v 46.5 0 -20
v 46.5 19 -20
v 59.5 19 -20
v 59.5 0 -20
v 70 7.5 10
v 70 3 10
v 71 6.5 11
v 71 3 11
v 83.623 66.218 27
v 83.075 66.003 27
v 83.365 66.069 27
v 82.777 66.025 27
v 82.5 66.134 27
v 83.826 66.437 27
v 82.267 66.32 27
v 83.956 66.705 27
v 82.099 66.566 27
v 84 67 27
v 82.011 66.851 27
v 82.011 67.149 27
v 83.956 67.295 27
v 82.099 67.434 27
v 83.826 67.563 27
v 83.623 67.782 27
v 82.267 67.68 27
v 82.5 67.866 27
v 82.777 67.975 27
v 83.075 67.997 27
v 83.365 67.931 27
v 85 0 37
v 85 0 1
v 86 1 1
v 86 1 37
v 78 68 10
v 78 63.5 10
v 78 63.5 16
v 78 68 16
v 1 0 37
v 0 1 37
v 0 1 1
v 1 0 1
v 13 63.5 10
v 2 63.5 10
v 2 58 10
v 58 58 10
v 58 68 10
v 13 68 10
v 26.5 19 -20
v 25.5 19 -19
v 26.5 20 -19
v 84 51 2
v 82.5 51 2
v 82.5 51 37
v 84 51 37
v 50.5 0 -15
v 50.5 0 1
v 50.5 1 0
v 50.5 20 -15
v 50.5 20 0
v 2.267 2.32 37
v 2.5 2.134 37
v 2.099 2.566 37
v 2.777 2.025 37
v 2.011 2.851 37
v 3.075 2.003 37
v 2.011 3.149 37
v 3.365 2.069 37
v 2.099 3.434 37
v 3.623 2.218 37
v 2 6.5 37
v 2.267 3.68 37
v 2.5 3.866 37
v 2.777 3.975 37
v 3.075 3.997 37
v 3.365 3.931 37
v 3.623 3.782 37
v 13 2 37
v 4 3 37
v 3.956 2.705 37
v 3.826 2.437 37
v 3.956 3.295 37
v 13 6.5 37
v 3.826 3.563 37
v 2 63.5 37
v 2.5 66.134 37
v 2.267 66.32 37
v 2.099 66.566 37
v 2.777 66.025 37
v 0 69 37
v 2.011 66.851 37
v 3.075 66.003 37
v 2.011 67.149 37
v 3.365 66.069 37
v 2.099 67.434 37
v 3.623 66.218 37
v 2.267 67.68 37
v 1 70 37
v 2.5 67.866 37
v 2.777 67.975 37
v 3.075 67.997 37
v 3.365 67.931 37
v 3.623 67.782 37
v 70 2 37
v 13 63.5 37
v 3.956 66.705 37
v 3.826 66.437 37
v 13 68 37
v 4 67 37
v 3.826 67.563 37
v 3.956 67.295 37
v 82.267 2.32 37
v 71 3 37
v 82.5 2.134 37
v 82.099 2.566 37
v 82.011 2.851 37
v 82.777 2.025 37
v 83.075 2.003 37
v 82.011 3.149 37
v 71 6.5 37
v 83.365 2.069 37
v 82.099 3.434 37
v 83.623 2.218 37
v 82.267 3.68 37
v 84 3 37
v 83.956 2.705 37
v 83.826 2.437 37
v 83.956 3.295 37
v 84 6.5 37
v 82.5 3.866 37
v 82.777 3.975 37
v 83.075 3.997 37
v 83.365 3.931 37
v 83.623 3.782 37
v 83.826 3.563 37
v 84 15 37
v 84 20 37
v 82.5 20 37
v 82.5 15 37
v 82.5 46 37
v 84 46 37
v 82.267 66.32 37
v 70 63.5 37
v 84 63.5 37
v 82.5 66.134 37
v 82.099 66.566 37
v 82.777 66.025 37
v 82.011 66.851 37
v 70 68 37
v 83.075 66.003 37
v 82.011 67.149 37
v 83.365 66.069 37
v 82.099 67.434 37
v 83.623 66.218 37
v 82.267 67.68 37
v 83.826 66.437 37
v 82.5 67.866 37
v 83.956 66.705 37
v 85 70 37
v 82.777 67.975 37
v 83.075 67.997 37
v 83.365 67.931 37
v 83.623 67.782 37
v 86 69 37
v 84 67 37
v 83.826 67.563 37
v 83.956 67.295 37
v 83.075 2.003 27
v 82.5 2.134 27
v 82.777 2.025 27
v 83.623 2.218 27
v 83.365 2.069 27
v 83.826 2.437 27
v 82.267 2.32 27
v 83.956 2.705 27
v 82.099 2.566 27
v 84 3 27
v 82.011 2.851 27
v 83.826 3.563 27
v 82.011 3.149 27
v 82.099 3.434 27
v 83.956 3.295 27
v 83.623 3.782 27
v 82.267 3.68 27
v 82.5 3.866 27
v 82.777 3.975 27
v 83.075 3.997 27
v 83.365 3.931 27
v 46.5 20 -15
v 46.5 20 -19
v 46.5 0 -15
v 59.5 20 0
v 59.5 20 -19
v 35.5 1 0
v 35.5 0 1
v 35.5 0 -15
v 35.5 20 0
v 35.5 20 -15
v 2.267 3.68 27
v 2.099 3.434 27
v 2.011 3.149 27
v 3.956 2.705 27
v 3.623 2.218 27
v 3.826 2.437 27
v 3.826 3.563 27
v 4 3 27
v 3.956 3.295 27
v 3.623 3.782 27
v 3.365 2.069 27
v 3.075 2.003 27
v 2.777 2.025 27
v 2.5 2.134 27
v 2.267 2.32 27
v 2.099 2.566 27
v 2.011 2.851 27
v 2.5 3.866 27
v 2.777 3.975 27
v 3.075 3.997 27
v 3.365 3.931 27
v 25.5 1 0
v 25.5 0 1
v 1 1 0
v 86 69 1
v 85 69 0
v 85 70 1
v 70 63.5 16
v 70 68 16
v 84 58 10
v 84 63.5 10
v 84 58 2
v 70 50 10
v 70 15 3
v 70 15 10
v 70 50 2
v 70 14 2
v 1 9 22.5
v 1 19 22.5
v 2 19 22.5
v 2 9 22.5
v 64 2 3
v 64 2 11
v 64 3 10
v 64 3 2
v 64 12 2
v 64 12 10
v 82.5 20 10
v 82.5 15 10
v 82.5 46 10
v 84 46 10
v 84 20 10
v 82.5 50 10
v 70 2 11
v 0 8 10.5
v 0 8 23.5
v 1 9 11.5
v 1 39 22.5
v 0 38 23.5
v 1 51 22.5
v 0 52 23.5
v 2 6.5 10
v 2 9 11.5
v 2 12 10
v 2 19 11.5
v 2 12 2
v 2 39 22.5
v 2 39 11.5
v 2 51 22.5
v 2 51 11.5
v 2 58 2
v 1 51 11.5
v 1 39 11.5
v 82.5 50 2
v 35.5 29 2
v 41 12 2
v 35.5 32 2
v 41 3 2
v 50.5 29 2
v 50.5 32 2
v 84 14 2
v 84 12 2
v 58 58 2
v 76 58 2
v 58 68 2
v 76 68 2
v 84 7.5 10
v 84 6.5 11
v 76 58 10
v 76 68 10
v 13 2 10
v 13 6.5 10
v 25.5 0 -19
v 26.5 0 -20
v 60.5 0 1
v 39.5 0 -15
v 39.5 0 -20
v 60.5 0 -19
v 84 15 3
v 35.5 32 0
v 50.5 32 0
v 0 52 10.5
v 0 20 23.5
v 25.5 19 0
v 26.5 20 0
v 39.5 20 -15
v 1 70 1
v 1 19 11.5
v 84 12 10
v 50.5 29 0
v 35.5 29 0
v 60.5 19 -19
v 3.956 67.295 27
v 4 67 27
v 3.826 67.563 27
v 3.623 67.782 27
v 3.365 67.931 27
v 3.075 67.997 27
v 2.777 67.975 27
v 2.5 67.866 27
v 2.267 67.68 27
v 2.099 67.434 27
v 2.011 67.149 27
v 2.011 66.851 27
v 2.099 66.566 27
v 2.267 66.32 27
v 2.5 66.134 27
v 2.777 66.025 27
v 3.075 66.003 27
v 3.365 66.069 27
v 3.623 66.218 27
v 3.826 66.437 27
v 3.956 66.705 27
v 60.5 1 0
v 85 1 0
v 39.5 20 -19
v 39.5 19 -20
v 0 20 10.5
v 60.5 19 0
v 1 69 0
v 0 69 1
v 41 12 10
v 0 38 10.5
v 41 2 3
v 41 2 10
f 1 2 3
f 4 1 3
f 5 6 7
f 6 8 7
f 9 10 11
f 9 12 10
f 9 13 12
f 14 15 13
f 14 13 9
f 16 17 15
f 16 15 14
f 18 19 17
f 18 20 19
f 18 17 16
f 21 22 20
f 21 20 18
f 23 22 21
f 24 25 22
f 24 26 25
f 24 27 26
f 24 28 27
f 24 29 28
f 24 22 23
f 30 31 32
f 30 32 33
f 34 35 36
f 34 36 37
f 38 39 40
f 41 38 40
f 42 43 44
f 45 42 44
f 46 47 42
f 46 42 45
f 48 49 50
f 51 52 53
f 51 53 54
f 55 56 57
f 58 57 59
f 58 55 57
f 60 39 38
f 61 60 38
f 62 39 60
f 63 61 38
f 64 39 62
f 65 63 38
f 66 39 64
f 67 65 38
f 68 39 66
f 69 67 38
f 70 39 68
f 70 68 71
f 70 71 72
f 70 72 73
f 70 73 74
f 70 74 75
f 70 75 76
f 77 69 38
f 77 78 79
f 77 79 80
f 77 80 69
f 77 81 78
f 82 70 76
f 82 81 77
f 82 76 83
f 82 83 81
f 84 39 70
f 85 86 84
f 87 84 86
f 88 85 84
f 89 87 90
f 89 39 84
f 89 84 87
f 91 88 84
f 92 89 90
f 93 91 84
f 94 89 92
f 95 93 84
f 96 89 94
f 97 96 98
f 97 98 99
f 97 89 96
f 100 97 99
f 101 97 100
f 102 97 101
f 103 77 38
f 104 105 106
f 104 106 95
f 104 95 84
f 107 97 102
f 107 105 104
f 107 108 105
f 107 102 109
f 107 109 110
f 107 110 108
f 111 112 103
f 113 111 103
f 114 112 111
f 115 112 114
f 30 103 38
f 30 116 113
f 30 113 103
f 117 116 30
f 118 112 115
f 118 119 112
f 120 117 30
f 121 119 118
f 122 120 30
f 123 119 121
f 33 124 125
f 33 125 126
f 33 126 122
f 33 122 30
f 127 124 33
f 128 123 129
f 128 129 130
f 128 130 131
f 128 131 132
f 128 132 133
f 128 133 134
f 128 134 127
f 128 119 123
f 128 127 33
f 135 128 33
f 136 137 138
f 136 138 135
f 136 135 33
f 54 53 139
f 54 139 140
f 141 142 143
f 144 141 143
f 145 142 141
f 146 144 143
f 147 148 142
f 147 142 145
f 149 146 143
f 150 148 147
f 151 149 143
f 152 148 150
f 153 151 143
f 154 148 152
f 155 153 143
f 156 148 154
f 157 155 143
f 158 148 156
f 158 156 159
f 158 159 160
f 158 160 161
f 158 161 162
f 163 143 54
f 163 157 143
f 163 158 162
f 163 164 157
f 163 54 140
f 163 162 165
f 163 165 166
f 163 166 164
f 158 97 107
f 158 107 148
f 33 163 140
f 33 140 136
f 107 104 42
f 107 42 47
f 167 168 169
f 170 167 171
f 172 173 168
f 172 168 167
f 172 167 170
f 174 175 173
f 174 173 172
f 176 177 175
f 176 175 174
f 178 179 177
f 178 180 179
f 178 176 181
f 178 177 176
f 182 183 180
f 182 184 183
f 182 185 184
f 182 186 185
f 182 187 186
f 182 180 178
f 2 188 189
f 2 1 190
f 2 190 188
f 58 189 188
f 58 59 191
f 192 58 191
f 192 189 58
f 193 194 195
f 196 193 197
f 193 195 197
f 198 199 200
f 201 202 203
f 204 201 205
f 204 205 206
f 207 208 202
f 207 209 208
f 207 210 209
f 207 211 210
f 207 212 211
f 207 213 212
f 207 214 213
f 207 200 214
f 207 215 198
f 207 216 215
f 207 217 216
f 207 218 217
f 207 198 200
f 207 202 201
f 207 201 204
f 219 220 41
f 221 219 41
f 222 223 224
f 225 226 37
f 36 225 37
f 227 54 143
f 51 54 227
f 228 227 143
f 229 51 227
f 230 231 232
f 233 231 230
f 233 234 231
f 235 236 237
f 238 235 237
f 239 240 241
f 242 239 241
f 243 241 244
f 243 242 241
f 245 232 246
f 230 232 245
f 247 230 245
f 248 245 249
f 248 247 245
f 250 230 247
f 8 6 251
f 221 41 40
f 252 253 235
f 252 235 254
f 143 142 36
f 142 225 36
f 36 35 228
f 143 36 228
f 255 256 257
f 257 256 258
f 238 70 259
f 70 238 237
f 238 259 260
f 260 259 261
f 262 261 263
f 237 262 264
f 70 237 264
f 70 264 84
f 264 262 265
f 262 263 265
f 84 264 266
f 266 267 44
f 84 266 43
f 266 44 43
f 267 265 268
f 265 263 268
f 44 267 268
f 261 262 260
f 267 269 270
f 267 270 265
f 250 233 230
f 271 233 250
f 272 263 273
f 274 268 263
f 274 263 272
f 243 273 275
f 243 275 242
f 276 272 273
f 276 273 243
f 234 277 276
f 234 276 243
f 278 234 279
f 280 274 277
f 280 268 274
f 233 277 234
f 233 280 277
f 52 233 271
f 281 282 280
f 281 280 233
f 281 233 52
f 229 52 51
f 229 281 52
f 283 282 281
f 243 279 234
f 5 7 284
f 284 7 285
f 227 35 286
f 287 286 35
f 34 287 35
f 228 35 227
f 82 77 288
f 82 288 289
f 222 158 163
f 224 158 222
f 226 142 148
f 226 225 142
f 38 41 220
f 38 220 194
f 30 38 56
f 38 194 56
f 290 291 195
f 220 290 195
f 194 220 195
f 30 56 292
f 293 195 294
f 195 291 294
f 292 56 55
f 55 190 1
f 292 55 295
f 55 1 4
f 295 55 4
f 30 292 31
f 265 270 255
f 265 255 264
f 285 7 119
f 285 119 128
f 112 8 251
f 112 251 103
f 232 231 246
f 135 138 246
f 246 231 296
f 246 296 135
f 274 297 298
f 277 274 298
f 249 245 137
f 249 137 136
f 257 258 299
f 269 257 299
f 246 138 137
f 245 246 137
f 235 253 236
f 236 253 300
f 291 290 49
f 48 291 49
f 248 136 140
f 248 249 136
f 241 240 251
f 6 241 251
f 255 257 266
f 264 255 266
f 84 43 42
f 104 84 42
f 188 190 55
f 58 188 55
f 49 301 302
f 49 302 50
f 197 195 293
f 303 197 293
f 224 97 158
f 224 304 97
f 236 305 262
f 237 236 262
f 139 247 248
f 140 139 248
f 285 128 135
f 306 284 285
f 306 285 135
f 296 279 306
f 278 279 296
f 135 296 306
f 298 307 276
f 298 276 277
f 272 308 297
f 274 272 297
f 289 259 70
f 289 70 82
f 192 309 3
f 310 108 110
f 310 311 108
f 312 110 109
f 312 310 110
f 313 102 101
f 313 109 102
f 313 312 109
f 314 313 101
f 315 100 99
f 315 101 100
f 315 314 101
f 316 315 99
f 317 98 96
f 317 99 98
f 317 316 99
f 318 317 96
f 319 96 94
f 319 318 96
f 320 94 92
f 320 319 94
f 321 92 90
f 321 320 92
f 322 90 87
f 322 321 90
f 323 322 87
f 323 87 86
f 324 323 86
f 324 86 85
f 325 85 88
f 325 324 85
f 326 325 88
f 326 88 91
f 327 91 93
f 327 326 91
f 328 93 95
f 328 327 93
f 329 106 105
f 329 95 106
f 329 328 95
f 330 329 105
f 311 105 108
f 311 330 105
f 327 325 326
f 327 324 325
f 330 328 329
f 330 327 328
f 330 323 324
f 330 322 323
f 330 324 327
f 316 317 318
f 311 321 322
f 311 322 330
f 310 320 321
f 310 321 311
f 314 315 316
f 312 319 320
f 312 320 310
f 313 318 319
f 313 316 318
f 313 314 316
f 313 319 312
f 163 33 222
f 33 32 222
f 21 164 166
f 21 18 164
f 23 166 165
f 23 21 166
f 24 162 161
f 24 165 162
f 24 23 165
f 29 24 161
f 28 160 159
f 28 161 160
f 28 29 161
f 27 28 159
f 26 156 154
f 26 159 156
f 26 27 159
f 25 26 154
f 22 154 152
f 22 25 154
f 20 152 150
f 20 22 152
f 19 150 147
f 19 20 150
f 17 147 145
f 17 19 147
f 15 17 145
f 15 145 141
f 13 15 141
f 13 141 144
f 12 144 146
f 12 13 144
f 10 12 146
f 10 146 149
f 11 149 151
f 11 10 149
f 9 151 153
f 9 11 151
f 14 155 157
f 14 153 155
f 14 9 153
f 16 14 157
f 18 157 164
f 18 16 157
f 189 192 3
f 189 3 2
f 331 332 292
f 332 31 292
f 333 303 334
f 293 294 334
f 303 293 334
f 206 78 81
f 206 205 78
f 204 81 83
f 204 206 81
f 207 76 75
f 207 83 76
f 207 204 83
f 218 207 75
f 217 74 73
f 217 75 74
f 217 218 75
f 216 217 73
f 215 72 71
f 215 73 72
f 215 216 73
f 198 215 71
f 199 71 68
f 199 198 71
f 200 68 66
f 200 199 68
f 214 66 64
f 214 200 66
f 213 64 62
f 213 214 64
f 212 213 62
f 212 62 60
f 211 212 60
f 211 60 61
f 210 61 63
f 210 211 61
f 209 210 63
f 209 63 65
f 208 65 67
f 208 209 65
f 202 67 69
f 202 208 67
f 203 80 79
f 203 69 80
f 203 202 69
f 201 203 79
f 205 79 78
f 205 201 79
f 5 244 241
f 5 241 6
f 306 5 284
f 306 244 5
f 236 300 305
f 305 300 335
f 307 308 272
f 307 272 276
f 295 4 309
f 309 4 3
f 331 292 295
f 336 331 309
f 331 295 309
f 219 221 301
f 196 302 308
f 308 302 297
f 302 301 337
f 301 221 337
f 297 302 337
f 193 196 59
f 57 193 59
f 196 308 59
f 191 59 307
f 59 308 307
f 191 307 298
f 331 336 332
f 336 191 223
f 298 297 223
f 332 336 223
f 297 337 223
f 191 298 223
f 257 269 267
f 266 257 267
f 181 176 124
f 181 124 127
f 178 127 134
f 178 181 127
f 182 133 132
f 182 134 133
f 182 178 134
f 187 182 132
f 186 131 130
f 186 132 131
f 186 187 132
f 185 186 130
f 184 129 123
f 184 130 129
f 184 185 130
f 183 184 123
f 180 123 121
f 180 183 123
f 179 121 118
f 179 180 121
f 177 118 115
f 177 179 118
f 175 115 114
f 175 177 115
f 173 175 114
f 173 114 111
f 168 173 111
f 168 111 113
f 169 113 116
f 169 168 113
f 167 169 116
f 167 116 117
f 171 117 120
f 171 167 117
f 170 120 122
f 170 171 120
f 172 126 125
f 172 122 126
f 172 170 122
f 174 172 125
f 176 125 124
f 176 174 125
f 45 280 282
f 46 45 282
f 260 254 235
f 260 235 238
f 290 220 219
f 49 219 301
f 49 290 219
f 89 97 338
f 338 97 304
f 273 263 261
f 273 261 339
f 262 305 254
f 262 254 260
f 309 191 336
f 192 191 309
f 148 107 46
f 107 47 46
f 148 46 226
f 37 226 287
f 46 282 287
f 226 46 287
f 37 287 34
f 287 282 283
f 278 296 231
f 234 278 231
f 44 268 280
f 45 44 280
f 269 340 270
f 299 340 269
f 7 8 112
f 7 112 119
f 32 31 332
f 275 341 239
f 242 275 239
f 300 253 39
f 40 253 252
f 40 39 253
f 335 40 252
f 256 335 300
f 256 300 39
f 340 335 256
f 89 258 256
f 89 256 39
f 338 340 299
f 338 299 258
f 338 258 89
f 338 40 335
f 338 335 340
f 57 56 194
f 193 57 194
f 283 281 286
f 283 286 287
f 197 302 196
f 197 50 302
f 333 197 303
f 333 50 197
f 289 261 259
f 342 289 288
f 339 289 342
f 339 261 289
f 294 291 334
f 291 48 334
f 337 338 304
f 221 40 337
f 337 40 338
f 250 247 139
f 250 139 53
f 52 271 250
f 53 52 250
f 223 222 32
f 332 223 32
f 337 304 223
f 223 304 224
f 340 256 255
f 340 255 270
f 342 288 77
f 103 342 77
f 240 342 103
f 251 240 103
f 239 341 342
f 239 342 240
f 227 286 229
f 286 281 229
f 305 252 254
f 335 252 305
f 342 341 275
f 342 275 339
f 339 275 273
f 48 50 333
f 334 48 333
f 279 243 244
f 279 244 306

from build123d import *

# Parameters (mm, degrees)
BOX028_W          = 15
BOX028_H          = 3
BOX028_DEPTH      = 3
BOX001_W          = 86
BOX001_H          = 2
BOX001_DEPTH      = 37
BOX002_W          = 86
BOX002_H          = 2
BOX002_DEPTH      = 37
BOX004_W          = 2
BOX004_H          = 70
BOX004_DEPTH      = 37
CYLINDER_R        = 1
CYLINDER_DEPTH    = 10
BOX005_W          = 13
BOX005_H          = 6.5
BOX005_DEPTH      = 37
CYLINDER001_R     = 1
CYLINDER001_DEPTH = 10
BOX007_W          = 13
BOX007_H          = 6.5
BOX007_DEPTH      = 37
CYLINDER002_R     = 1
CYLINDER002_DEPTH = 10
BOX006_W          = 15
BOX006_H          = 6.5
BOX006_DEPTH      = 37
BOX009_W          = 10
BOX009_H          = 10
BOX009_DEPTH      = 11
BOX010_W          = 16
BOX010_H          = 12
BOX010_DEPTH      = 11
BOX003_W          = 2
BOX003_H          = 70
BOX003_DEPTH      = 37
BOX018_W          = 15
BOX018_H          = 35
BOX018_DEPTH      = 10
BOX019_W          = 10
BOX019_H          = 20
BOX019_DEPTH      = 20
BOX020_W          = 10
BOX020_H          = 20
BOX020_DEPTH      = 20
BOX021_W          = 14
BOX021_H          = 20
BOX021_DEPTH      = 5
BOX022_W          = 14
BOX022_H          = 20
BOX022_DEPTH      = 5
BOX023_W          = 1.5
BOX023_H          = 5
BOX023_DEPTH      = 37
BOX024_W          = 1.5
BOX024_H          = 5
BOX024_DEPTH      = 37
BOX025_W          = 23
BOX025_H          = 10
BOX025_DEPTH      = 8
BOX016_W          = 86
BOX016_H          = 12
BOX016_DEPTH      = 10
BOX026_W          = 18
BOX026_H          = 10
BOX026_DEPTH      = 8
BOX017_W          = 86
BOX017_H          = 12
BOX017_DEPTH      = 10
BOX027_W          = 8
BOX027_H          = 5
BOX027_DEPTH      = 14
CYLINDER003_R     = 1
CYLINDER003_DEPTH = 10
BOX008_W          = 16
BOX008_H          = 6.5
BOX008_DEPTH      = 37
BOX_W             = 86
BOX_H             = 70
BOX_DEPTH         = 2
CHAMFER_SIZE      = 1


with BuildPart() as cubo028:
    # Box028 → Box028 (new body)
    with BuildSketch(Plane(origin=(35.5, 29, -1), x_dir=(1, 0, 0), z_dir=(0, 0, 1))):
        with Locations((7.5, 1.5)):
            Rectangle(BOX028_W, BOX028_H)
    extrude(amount=BOX028_DEPTH)


with BuildPart() as cubo001:
    # Box001 → Box001 (new body)
    with BuildSketch(Plane.XY):
        with Locations((43, 1)):
            Rectangle(BOX001_W, BOX001_H)
    extrude(amount=BOX001_DEPTH)


with BuildPart() as cubo002:
    # Box002 → Box002 (new body)
    with BuildSketch(Plane(origin=(0, 68, 0), x_dir=(1, 0, 0), z_dir=(0, 0, 1))):
        with Locations((43, 1)):
            Rectangle(BOX002_W, BOX002_H)
    extrude(amount=BOX002_DEPTH)


with BuildPart() as cubo004:
    # Box004 → Box004 (new body)
    with BuildSketch(Plane(origin=(84, 0, 0), x_dir=(1, 0, 0), z_dir=(0, 0, 1))):
        with Locations((1, 35)):
            Rectangle(BOX004_W, BOX004_H)
    extrude(amount=BOX004_DEPTH)


with BuildPart() as cilindro:
    # Cylinder → Cylinder (new body)
    with BuildSketch(Plane(origin=(3, 3, 27), x_dir=(1, 0, 0), z_dir=(0, 0, 1))):
        Circle(CYLINDER_R)
    extrude(amount=CYLINDER_DEPTH)


with BuildPart() as cut002:
    # Box005 → Box005 (new body)
    with BuildSketch(Plane.XY):
        with Locations((6.5, 3.25)):
            Rectangle(BOX005_W, BOX005_H)
    extrude(amount=BOX005_DEPTH)

    # Cut002: cut Cilindro
    add(cilindro.part, mode=Mode.SUBTRACT)


with BuildPart() as cilindro001:
    # Cylinder001 → Cylinder001 (new body)
    with BuildSketch(Plane(origin=(3, 67, 27), x_dir=(1, 0, 0), z_dir=(0, 0, 1))):
        Circle(CYLINDER001_R)
    extrude(amount=CYLINDER001_DEPTH)


with BuildPart() as cut003:
    # Box007 → Box007 (new body)
    with BuildSketch(Plane(origin=(0, 63.5, 0), x_dir=(1, 0, 0), z_dir=(0, 0, 1))):
        with Locations((6.5, 3.25)):
            Rectangle(BOX007_W, BOX007_H)
    extrude(amount=BOX007_DEPTH)

    # Cut003: cut Cilindro001
    add(cilindro001.part, mode=Mode.SUBTRACT)


with BuildPart() as cilindro002:
    # Cylinder002 → Cylinder002 (new body)
    with BuildSketch(Plane(origin=(83, 3, 27), x_dir=(1, 0, 0), z_dir=(0, 0, 1))):
        Circle(CYLINDER002_R)
    extrude(amount=CYLINDER002_DEPTH)


with BuildPart() as cut004:
    # Box006 → Box006 (new body)
    with BuildSketch(Plane(origin=(71, 0, 0), x_dir=(1, 0, 0), z_dir=(0, 0, 1))):
        with Locations((7.5, 3.25)):
            Rectangle(BOX006_W, BOX006_H)
    extrude(amount=BOX006_DEPTH)

    # Cut004: cut Cilindro002
    add(cilindro002.part, mode=Mode.SUBTRACT)


with BuildPart() as cubo009:
    # Box009 → Box009 (new body)
    with BuildSketch(Plane(origin=(-1, 9, 11.5), x_dir=(1, 0, 0), z_dir=(0, 0, 1))):
        with Locations((5, 5)):
            Rectangle(BOX009_W, BOX009_H)
    extrude(amount=BOX009_DEPTH)


with BuildPart() as cubo010:
    # Box010 → Box010 (new body)
    with BuildSketch(Plane(origin=(-1, 39, 11.5), x_dir=(1, 0, 0), z_dir=(0, 0, 1))):
        with Locations((8, 6)):
            Rectangle(BOX010_W, BOX010_H)
    extrude(amount=BOX010_DEPTH)


with BuildPart() as cut006:
    # Box003 → Box003 (new body)
    with BuildSketch(Plane.XY):
        with Locations((1, 35)):
            Rectangle(BOX003_W, BOX003_H)
    extrude(amount=BOX003_DEPTH)

    # Cut: cut Cubo010
    add(cubo010.part, mode=Mode.SUBTRACT)

    # Cut006: cut Cubo009
    add(cubo009.part, mode=Mode.SUBTRACT)


with BuildPart() as cubo018:
    # Box018 → Box018 (new body)
    with BuildSketch(Plane(origin=(70, 15, 0), x_dir=(1, 0, 0), z_dir=(0, 0, 1))):
        with Locations((7.5, 17.5)):
            Rectangle(BOX018_W, BOX018_H)
    extrude(amount=BOX018_DEPTH)


with BuildPart() as cubo019:
    # Box019 → Box019 (new body)
    with BuildSketch(Plane(origin=(25.5, 0, -20), x_dir=(1, 0, 0), z_dir=(0, 0, 1))):
        with Locations((5, 10)):
            Rectangle(BOX019_W, BOX019_H)
    extrude(amount=BOX019_DEPTH)


with BuildPart() as cubo020:
    # Box020 → Box020 (new body)
    with BuildSketch(Plane(origin=(50.5, 0, -20), x_dir=(1, 0, 0), z_dir=(0, 0, 1))):
        with Locations((5, 10)):
            Rectangle(BOX020_W, BOX020_H)
    extrude(amount=BOX020_DEPTH)


with BuildPart() as cubo021:
    # Box021 → Box021 (new body)
    with BuildSketch(Plane(origin=(25.5, 0, -20), x_dir=(1, 0, 0), z_dir=(0, 0, 1))):
        with Locations((7, 10)):
            Rectangle(BOX021_W, BOX021_H)
    extrude(amount=BOX021_DEPTH)


with BuildPart() as cubo022:
    # Box022 → Box022 (new body)
    with BuildSketch(Plane(origin=(46.5, 0, -20), x_dir=(1, 0, 0), z_dir=(0, 0, 1))):
        with Locations((7, 10)):
            Rectangle(BOX022_W, BOX022_H)
    extrude(amount=BOX022_DEPTH)


with BuildPart() as cubo023:
    # Box023 → Box023 (new body)
    with BuildSketch(Plane(origin=(82.5, 15, 0), x_dir=(1, 0, 0), z_dir=(0, 0, 1))):
        with Locations((0.75, 2.5)):
            Rectangle(BOX023_W, BOX023_H)
    extrude(amount=BOX023_DEPTH)


with BuildPart() as cubo024:
    # Box024 → Box024 (new body)
    with BuildSketch(Plane(origin=(82.5, 46, 0), x_dir=(1, 0, 0), z_dir=(0, 0, 1))):
        with Locations((0.75, 2.5)):
            Rectangle(BOX024_W, BOX024_H)
    extrude(amount=BOX024_DEPTH)


with BuildPart() as cubo025:
    # Box025 → Box025 (new body)
    with BuildSketch(Plane(origin=(41, 2, 2), x_dir=(1, 0, 0), z_dir=(0, 0, 1))):
        with Locations((11.5, 5)):
            Rectangle(BOX025_W, BOX025_H)
    extrude(amount=BOX025_DEPTH)


with BuildPart() as cut007:
    # Box016 → Box016 (new body)
    with BuildSketch(Plane.XY):
        with Locations((43, 6)):
            Rectangle(BOX016_W, BOX016_H)
    extrude(amount=BOX016_DEPTH)

    # Cut007: cut Cubo025
    add(cubo025.part, mode=Mode.SUBTRACT)


with BuildPart() as cubo026:
    # Box026 → Box026 (new body)
    with BuildSketch(Plane(origin=(58, 58, 2), x_dir=(1, 0, 0), z_dir=(0, 0, 1))):
        with Locations((9, 5)):
            Rectangle(BOX026_W, BOX026_H)
    extrude(amount=BOX026_DEPTH)


with BuildPart() as cut008:
    # Box017 → Box017 (new body)
    with BuildSketch(Plane(origin=(0, 58, 0), x_dir=(1, 0, 0), z_dir=(0, 0, 1))):
        with Locations((43, 6)):
            Rectangle(BOX017_W, BOX017_H)
    extrude(amount=BOX017_DEPTH)

    # Cut008: cut Cubo026
    add(cubo026.part, mode=Mode.SUBTRACT)


with BuildPart() as cubo027:
    # Box027 → Box027 (new body)
    with BuildSketch(Plane(origin=(70, 63, 2), x_dir=(1, 0, 0), z_dir=(0, 0, 1))):
        with Locations((4, 2.5)):
            Rectangle(BOX027_W, BOX027_H)
    extrude(amount=BOX027_DEPTH)


with BuildPart() as cilindro003:
    # Cylinder003 → Cylinder003 (new body)
    with BuildSketch(Plane(origin=(83, 67, 27), x_dir=(1, 0, 0), z_dir=(0, 0, 1))):
        Circle(CYLINDER003_R)
    extrude(amount=CYLINDER003_DEPTH)


with BuildPart() as cut009:
    # Box008 → Box008 (new body)
    with BuildSketch(Plane(origin=(70, 63.5, 0), x_dir=(1, 0, 0), z_dir=(0, 0, 1))):
        with Locations((8, 3.25)):
            Rectangle(BOX008_W, BOX008_H)
    extrude(amount=BOX008_DEPTH)

    # Cut005: cut Cilindro003
    add(cilindro003.part, mode=Mode.SUBTRACT)

    # Cut009: cut Cubo027
    add(cubo027.part, mode=Mode.SUBTRACT)


with BuildPart() as cut010:
    # Box → Box (new body)
    with BuildSketch(Plane.XY):
        with Locations((43, 35)):
            Rectangle(BOX_W, BOX_H)
    extrude(amount=BOX_DEPTH)

    # Fusion: union Cubo001, Cubo002, Cubo004, Cut002, Cut003, Cut004, Cut006, Cubo018, Cubo019, Cubo020, Cubo021, Cubo022, Cubo023, Cubo024, Cut007, Cut008, Cut009
    add(cubo001.part)
    add(cubo002.part)
    add(cubo004.part)
    add(cut002.part)
    add(cut003.part)
    add(cut004.part)
    add(cut006.part)
    add(cubo018.part)
    add(cubo019.part)
    add(cubo020.part)
    add(cubo021.part)
    add(cubo022.part)
    add(cubo023.part)
    add(cubo024.part)
    add(cut007.part)
    add(cut008.part)
    add(cut009.part)

    # Chamfer
    chamfer_edges = [cut010.edges().sort_by_distance(p)[0] for p in [
        (12.75, 0, 0),
        (43, 0, 0),
        (73.25, 0, 0),
        (86, 0, 18.5),
        (0, 0, 18.5),
        (0, 45, 11.5),
        (0, 51, 17),
        (0, 39, 17),
        (0, 45, 22.5),
        (0, 14, 11.5),
        (0, 19, 17),
        (0, 9, 17),
        (0, 14, 22.5),
        (0, 70, 18.5),
        (0, 35, 0),
        (43, 70, 0),
        (86, 35, 0),
        (77.5, 6.5, 10),
        (71, 4.25, 10),
        (67.5, 2, 10),
        (71, 2, 23.5),
        (25.5, 20, -10),
        (25.5, 10, -20),
        (60.5, 10, -20),
        (60.5, 20, -10),
        (32.5, 20, -20),
        (53.5, 20, -20),
        (86, 70, 18.5),
        (52.5, 2, 2),
        (77, 15, 2),
    ]]
    chamfer(chamfer_edges, length=CHAMFER_SIZE)

    # Cut010: cut Cubo028
    add(cubo028.part, mode=Mode.SUBTRACT)


solid = cut010.part
